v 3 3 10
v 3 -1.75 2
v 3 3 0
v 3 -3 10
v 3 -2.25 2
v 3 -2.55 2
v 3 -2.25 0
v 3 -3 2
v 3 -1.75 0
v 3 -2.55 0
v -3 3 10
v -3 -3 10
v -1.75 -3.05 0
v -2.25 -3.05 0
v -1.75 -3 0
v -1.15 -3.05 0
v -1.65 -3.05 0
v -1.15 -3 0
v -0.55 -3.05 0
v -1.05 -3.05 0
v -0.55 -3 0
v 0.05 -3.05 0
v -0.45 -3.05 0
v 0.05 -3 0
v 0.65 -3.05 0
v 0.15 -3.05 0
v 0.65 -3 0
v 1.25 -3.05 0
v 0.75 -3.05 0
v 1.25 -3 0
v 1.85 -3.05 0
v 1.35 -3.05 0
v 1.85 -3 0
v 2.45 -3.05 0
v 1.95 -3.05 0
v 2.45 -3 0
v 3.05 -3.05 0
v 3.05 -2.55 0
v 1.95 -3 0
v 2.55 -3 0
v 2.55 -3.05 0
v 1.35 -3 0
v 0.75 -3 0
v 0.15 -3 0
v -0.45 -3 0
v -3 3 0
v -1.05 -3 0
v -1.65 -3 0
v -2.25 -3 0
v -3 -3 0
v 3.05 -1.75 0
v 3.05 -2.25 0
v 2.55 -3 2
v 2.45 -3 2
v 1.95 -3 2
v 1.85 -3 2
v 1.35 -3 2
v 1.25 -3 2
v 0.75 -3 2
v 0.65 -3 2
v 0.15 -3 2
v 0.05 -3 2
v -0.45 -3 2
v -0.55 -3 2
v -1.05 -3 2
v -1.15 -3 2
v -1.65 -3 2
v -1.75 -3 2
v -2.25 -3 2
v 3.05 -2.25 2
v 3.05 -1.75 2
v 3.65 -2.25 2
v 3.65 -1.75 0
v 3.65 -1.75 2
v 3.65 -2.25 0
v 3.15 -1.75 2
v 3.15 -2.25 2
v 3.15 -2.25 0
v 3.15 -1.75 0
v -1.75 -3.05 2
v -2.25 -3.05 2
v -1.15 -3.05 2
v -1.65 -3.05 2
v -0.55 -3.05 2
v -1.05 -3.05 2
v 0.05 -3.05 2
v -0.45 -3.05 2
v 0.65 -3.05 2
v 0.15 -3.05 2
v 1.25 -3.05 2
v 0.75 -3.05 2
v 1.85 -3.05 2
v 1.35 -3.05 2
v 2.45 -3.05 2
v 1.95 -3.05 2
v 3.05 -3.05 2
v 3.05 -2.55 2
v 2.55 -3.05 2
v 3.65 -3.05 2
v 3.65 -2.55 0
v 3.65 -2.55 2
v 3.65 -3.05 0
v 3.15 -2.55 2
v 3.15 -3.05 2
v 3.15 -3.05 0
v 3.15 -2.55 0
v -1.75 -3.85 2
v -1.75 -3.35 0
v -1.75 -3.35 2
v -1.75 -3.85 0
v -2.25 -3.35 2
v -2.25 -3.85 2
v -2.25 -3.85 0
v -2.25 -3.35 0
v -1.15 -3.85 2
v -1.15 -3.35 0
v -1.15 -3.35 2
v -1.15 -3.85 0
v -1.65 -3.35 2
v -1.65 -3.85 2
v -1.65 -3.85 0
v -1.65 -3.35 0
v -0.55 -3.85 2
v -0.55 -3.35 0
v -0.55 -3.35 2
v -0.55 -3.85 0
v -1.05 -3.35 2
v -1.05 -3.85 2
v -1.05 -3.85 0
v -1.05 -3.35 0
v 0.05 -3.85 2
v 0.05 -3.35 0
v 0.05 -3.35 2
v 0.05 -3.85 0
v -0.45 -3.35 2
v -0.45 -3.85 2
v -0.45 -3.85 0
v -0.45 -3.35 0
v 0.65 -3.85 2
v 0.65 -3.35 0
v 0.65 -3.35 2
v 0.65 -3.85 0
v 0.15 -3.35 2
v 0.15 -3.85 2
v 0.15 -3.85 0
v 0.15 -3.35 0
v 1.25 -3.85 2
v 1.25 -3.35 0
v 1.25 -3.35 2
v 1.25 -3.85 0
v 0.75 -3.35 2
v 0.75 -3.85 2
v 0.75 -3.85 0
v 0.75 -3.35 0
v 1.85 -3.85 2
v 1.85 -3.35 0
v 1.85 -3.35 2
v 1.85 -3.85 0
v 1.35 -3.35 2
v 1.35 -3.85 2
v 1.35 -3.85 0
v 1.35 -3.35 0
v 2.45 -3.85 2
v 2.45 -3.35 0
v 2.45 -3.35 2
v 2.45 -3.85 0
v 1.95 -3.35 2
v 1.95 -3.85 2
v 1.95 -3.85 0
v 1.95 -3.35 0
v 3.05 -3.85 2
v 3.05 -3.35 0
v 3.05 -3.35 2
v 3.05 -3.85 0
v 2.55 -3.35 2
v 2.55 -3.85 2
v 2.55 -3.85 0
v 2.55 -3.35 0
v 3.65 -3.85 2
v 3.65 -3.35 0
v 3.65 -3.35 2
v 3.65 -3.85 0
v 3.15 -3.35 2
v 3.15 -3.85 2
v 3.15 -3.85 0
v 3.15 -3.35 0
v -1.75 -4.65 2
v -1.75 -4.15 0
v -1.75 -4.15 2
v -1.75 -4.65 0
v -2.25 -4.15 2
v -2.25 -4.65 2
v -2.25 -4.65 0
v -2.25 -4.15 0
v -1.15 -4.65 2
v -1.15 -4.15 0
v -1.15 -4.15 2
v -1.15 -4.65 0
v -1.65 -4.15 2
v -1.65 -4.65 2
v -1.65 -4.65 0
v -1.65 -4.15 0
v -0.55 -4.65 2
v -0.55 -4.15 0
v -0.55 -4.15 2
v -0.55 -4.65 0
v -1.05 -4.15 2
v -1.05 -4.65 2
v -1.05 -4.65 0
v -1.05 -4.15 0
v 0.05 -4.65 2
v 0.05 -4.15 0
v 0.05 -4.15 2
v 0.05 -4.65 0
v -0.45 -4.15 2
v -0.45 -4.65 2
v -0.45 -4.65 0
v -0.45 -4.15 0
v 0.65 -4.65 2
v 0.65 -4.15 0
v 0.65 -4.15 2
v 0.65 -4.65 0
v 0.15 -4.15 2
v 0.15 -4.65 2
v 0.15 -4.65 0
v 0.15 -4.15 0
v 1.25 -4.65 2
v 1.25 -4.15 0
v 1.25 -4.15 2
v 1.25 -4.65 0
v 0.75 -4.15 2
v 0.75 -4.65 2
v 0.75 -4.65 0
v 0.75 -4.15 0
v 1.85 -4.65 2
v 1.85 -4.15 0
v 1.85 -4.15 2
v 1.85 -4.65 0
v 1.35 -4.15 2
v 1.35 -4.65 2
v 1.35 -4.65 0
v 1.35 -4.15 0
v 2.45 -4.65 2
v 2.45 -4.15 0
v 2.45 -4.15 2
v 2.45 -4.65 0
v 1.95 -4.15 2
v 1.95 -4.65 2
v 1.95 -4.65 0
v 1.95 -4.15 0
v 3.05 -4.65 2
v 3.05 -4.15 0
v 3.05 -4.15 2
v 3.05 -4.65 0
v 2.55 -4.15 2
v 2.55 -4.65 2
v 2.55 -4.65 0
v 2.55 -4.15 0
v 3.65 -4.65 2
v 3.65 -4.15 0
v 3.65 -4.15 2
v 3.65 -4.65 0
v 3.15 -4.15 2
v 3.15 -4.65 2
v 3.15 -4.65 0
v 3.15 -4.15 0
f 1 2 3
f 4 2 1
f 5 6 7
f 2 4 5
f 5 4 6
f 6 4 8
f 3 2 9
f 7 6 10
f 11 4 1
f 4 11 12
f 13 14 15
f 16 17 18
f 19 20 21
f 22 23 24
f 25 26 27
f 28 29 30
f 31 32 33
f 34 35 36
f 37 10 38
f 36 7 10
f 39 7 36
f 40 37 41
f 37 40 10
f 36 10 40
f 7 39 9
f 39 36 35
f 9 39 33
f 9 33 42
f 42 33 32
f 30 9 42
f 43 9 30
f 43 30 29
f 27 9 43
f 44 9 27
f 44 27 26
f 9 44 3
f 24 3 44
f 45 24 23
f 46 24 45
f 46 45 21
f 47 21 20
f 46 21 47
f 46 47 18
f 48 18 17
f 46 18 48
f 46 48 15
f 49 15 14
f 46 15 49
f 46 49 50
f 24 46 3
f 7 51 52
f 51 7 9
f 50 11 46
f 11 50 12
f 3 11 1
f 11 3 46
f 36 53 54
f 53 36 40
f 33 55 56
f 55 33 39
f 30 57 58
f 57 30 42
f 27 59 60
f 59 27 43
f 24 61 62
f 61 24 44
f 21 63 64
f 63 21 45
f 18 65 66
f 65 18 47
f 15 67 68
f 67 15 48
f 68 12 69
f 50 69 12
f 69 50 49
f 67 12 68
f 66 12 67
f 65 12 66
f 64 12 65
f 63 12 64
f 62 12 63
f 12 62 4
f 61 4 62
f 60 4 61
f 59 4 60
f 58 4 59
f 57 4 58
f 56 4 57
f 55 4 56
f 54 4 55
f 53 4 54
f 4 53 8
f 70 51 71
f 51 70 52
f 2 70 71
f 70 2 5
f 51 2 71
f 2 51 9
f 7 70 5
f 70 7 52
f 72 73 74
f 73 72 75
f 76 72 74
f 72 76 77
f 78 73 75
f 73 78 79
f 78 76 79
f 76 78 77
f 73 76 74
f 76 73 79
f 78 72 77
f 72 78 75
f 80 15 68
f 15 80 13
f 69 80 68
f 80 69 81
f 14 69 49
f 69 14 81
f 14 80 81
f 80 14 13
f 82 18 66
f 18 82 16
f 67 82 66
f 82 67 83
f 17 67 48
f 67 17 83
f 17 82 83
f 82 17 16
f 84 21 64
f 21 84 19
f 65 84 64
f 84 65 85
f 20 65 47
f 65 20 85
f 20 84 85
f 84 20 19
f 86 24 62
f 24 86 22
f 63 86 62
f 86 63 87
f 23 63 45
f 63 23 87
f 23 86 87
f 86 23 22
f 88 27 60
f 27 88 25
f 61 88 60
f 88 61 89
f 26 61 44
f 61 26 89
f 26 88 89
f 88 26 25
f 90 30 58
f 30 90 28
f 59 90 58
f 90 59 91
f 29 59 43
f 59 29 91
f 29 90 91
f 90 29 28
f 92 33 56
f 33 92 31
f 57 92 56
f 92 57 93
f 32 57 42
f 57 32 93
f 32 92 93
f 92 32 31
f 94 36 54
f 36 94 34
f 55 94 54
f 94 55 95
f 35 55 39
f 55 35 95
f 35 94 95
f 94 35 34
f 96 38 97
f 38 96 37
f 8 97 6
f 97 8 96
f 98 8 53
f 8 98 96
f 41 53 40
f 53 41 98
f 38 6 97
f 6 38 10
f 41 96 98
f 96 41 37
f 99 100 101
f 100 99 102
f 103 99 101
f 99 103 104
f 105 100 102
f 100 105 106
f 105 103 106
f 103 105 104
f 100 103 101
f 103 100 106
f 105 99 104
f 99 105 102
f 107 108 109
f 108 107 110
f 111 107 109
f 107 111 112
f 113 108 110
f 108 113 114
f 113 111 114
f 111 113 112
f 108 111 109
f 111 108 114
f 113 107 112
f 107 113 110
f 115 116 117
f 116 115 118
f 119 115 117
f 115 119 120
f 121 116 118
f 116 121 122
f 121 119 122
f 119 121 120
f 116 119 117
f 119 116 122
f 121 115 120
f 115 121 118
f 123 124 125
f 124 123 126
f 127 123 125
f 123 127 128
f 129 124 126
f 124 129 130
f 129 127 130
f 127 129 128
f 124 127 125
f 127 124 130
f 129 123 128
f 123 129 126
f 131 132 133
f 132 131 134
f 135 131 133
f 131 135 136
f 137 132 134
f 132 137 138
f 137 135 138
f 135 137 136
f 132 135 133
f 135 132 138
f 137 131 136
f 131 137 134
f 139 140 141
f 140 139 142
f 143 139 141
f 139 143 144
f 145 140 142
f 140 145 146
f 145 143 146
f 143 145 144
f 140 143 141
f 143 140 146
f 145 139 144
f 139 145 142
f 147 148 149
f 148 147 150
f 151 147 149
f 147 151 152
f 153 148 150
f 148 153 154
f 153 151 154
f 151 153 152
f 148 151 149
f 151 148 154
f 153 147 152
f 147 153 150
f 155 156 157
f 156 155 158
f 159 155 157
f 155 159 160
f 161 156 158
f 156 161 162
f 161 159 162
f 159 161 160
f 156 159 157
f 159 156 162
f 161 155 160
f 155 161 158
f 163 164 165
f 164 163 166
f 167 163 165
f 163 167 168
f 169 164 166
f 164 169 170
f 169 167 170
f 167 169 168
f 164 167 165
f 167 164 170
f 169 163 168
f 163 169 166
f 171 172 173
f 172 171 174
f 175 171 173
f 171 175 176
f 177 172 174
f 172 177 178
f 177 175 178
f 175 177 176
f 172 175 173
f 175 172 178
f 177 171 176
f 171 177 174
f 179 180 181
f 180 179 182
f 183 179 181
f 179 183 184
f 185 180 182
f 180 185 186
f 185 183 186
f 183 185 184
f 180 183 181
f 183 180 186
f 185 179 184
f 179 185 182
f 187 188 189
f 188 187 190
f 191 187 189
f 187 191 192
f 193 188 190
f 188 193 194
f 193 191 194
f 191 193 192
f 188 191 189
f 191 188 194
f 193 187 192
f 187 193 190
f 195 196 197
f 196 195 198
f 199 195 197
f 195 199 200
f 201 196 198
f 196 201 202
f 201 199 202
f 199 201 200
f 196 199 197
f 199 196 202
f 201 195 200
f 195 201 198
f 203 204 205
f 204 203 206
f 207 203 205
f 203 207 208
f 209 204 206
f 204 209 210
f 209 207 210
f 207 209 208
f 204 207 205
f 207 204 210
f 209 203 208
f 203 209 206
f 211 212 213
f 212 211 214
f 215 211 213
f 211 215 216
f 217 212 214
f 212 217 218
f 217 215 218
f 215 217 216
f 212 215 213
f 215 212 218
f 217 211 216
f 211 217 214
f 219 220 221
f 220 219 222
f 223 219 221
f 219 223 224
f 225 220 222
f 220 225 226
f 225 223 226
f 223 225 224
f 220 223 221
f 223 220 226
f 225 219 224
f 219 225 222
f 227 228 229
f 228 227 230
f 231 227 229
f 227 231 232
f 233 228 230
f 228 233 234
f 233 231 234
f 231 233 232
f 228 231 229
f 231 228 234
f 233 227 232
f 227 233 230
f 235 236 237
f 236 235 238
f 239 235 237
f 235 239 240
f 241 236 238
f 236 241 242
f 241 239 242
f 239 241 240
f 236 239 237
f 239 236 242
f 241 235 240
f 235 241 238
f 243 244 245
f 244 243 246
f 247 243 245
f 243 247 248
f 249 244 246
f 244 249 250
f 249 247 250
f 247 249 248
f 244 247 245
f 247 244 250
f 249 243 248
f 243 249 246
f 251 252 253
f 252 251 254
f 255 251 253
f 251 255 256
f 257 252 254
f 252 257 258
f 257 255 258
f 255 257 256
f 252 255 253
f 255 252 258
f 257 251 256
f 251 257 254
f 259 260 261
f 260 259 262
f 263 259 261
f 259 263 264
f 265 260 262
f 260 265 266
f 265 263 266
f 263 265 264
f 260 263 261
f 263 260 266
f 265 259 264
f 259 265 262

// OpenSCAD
translate([0, 0, 5]) color([0,1,0,0.9]) cube([6, 6, 10], center=true);
translate([-2, -2, 1]) color([1,0,0]) cube([0.5, 0.5, 2], center=true);
translate([-1.4, -2, 1]) color([1,0,0]) cube([0.5, 0.5, 2], center=true);
translate([-0.8, -2, 1]) color([1,0,0]) cube([0.5, 0.5, 2], center=true);
translate([-0.2, -2, 1]) color([1,0,0]) cube([0.5, 0.5, 2], center=true);
translate([0.4, -2, 1]) color([1,0,0]) cube([0.5, 0.5, 2], center=true);
translate([1, -2, 1]) color([1,0,0]) cube([0.5, 0.5, 2], center=true);
translate([1.6, -2, 1]) color([1,0,0]) cube([0.5, 0.5, 2], center=true);
translate([2.2, -2, 1]) color([1,0,0]) cube([0.5, 0.5, 2], center=true);
translate([2.8, -2, 1]) color([1,0,0]) cube([0.5, 0.5, 2], center=true);
translate([3.4, -2, 1]) color([1,0,0]) cube([0.5, 0.5, 2], center=true);
translate([-2, -2.8, 1]) color([1,0,0]) cube([0.5, 0.5, 2], center=true);
translate([-1.4, -2.8, 1]) color([1,0,0]) cube([0.5, 0.5, 2], center=true);
translate([-0.8, -2.8, 1]) color([1,0,0]) cube([0.5, 0.5, 2], center=true);
translate([-0.2, -2.8, 1]) color([1,0,0]) cube([0.5, 0.5, 2], center=true);
translate([0.4, -2.8, 1]) color([1,0,0]) cube([0.5, 0.5, 2], center=true);
translate([1, -2.8, 1]) color([1,0,0]) cube([0.5, 0.5, 2], center=true);
translate([1.6, -2.8, 1]) color([1,0,0]) cube([0.5, 0.5, 2], center=true);
translate([2.2, -2.8, 1]) color([1,0,0]) cube([0.5, 0.5, 2], center=true);
translate([2.8, -2.8, 1]) color([1,0,0]) cube([0.5, 0.5, 2], center=true);
translate([3.4, -2.8, 1]) color([1,0,0]) cube([0.5, 0.5, 2], center=true);
translate([-2, -3.6, 1]) color([1,0,0]) cube([0.5, 0.5, 2], center=true);
translate([-1.4, -3.6, 1]) color([1,0,0]) cube([0.5, 0.5, 2], center=true);
translate([-0.8, -3.6, 1]) color([1,0,0]) cube([0.5, 0.5, 2], center=true);
translate([-0.2, -3.6, 1]) color([1,0,0]) cube([0.5, 0.5, 2], center=true);
translate([0.4, -3.6, 1]) color([1,0,0]) cube([0.5, 0.5, 2], center=true);
translate([1, -3.6, 1]) color([1,0,0]) cube([0.5, 0.5, 2], center=true);
translate([1.6, -3.6, 1]) color([1,0,0]) cube([0.5, 0.5, 2], center=true);
translate([2.2, -3.6, 1]) color([1,0,0]) cube([0.5, 0.5, 2], center=true);
translate([2.8, -3.6, 1]) color([1,0,0]) cube([0.5, 0.5, 2], center=true);
translate([3.4, -3.6, 1]) color([1,0,0]) cube([0.5, 0.5, 2], center=true);
translate([-2, -4.4, 1]) color([1,0,0]) cube([0.5, 0.5, 2], center=true);
translate([-1.4, -4.4, 1]) color([1,0,0]) cube([0.5, 0.5, 2], center=true);
translate([-0.8, -4.4, 1]) color([1,0,0]) cube([0.5, 0.5, 2], center=true);
translate([-0.2, -4.4, 1]) color([1,0,0]) cube([0.5, 0.5, 2], center=true);
translate([0.4, -4.4, 1]) color([1,0,0]) cube([0.5, 0.5, 2], center=true);
translate([1, -4.4, 1]) color([1,0,0]) cube([0.5, 0.5, 2], center=true);
translate([1.6, -4.4, 1]) color([1,0,0]) cube([0.5, 0.5, 2], center=true);
translate([2.2, -4.4, 1]) color([1,0,0]) cube([0.5, 0.5, 2], center=true);
translate([2.8, -4.4, 1]) color([1,0,0]) cube([0.5, 0.5, 2], center=true);
translate([3.4, -4.4, 1]) color([1,0,0]) cube([0.5, 0.5, 2], center=true);
